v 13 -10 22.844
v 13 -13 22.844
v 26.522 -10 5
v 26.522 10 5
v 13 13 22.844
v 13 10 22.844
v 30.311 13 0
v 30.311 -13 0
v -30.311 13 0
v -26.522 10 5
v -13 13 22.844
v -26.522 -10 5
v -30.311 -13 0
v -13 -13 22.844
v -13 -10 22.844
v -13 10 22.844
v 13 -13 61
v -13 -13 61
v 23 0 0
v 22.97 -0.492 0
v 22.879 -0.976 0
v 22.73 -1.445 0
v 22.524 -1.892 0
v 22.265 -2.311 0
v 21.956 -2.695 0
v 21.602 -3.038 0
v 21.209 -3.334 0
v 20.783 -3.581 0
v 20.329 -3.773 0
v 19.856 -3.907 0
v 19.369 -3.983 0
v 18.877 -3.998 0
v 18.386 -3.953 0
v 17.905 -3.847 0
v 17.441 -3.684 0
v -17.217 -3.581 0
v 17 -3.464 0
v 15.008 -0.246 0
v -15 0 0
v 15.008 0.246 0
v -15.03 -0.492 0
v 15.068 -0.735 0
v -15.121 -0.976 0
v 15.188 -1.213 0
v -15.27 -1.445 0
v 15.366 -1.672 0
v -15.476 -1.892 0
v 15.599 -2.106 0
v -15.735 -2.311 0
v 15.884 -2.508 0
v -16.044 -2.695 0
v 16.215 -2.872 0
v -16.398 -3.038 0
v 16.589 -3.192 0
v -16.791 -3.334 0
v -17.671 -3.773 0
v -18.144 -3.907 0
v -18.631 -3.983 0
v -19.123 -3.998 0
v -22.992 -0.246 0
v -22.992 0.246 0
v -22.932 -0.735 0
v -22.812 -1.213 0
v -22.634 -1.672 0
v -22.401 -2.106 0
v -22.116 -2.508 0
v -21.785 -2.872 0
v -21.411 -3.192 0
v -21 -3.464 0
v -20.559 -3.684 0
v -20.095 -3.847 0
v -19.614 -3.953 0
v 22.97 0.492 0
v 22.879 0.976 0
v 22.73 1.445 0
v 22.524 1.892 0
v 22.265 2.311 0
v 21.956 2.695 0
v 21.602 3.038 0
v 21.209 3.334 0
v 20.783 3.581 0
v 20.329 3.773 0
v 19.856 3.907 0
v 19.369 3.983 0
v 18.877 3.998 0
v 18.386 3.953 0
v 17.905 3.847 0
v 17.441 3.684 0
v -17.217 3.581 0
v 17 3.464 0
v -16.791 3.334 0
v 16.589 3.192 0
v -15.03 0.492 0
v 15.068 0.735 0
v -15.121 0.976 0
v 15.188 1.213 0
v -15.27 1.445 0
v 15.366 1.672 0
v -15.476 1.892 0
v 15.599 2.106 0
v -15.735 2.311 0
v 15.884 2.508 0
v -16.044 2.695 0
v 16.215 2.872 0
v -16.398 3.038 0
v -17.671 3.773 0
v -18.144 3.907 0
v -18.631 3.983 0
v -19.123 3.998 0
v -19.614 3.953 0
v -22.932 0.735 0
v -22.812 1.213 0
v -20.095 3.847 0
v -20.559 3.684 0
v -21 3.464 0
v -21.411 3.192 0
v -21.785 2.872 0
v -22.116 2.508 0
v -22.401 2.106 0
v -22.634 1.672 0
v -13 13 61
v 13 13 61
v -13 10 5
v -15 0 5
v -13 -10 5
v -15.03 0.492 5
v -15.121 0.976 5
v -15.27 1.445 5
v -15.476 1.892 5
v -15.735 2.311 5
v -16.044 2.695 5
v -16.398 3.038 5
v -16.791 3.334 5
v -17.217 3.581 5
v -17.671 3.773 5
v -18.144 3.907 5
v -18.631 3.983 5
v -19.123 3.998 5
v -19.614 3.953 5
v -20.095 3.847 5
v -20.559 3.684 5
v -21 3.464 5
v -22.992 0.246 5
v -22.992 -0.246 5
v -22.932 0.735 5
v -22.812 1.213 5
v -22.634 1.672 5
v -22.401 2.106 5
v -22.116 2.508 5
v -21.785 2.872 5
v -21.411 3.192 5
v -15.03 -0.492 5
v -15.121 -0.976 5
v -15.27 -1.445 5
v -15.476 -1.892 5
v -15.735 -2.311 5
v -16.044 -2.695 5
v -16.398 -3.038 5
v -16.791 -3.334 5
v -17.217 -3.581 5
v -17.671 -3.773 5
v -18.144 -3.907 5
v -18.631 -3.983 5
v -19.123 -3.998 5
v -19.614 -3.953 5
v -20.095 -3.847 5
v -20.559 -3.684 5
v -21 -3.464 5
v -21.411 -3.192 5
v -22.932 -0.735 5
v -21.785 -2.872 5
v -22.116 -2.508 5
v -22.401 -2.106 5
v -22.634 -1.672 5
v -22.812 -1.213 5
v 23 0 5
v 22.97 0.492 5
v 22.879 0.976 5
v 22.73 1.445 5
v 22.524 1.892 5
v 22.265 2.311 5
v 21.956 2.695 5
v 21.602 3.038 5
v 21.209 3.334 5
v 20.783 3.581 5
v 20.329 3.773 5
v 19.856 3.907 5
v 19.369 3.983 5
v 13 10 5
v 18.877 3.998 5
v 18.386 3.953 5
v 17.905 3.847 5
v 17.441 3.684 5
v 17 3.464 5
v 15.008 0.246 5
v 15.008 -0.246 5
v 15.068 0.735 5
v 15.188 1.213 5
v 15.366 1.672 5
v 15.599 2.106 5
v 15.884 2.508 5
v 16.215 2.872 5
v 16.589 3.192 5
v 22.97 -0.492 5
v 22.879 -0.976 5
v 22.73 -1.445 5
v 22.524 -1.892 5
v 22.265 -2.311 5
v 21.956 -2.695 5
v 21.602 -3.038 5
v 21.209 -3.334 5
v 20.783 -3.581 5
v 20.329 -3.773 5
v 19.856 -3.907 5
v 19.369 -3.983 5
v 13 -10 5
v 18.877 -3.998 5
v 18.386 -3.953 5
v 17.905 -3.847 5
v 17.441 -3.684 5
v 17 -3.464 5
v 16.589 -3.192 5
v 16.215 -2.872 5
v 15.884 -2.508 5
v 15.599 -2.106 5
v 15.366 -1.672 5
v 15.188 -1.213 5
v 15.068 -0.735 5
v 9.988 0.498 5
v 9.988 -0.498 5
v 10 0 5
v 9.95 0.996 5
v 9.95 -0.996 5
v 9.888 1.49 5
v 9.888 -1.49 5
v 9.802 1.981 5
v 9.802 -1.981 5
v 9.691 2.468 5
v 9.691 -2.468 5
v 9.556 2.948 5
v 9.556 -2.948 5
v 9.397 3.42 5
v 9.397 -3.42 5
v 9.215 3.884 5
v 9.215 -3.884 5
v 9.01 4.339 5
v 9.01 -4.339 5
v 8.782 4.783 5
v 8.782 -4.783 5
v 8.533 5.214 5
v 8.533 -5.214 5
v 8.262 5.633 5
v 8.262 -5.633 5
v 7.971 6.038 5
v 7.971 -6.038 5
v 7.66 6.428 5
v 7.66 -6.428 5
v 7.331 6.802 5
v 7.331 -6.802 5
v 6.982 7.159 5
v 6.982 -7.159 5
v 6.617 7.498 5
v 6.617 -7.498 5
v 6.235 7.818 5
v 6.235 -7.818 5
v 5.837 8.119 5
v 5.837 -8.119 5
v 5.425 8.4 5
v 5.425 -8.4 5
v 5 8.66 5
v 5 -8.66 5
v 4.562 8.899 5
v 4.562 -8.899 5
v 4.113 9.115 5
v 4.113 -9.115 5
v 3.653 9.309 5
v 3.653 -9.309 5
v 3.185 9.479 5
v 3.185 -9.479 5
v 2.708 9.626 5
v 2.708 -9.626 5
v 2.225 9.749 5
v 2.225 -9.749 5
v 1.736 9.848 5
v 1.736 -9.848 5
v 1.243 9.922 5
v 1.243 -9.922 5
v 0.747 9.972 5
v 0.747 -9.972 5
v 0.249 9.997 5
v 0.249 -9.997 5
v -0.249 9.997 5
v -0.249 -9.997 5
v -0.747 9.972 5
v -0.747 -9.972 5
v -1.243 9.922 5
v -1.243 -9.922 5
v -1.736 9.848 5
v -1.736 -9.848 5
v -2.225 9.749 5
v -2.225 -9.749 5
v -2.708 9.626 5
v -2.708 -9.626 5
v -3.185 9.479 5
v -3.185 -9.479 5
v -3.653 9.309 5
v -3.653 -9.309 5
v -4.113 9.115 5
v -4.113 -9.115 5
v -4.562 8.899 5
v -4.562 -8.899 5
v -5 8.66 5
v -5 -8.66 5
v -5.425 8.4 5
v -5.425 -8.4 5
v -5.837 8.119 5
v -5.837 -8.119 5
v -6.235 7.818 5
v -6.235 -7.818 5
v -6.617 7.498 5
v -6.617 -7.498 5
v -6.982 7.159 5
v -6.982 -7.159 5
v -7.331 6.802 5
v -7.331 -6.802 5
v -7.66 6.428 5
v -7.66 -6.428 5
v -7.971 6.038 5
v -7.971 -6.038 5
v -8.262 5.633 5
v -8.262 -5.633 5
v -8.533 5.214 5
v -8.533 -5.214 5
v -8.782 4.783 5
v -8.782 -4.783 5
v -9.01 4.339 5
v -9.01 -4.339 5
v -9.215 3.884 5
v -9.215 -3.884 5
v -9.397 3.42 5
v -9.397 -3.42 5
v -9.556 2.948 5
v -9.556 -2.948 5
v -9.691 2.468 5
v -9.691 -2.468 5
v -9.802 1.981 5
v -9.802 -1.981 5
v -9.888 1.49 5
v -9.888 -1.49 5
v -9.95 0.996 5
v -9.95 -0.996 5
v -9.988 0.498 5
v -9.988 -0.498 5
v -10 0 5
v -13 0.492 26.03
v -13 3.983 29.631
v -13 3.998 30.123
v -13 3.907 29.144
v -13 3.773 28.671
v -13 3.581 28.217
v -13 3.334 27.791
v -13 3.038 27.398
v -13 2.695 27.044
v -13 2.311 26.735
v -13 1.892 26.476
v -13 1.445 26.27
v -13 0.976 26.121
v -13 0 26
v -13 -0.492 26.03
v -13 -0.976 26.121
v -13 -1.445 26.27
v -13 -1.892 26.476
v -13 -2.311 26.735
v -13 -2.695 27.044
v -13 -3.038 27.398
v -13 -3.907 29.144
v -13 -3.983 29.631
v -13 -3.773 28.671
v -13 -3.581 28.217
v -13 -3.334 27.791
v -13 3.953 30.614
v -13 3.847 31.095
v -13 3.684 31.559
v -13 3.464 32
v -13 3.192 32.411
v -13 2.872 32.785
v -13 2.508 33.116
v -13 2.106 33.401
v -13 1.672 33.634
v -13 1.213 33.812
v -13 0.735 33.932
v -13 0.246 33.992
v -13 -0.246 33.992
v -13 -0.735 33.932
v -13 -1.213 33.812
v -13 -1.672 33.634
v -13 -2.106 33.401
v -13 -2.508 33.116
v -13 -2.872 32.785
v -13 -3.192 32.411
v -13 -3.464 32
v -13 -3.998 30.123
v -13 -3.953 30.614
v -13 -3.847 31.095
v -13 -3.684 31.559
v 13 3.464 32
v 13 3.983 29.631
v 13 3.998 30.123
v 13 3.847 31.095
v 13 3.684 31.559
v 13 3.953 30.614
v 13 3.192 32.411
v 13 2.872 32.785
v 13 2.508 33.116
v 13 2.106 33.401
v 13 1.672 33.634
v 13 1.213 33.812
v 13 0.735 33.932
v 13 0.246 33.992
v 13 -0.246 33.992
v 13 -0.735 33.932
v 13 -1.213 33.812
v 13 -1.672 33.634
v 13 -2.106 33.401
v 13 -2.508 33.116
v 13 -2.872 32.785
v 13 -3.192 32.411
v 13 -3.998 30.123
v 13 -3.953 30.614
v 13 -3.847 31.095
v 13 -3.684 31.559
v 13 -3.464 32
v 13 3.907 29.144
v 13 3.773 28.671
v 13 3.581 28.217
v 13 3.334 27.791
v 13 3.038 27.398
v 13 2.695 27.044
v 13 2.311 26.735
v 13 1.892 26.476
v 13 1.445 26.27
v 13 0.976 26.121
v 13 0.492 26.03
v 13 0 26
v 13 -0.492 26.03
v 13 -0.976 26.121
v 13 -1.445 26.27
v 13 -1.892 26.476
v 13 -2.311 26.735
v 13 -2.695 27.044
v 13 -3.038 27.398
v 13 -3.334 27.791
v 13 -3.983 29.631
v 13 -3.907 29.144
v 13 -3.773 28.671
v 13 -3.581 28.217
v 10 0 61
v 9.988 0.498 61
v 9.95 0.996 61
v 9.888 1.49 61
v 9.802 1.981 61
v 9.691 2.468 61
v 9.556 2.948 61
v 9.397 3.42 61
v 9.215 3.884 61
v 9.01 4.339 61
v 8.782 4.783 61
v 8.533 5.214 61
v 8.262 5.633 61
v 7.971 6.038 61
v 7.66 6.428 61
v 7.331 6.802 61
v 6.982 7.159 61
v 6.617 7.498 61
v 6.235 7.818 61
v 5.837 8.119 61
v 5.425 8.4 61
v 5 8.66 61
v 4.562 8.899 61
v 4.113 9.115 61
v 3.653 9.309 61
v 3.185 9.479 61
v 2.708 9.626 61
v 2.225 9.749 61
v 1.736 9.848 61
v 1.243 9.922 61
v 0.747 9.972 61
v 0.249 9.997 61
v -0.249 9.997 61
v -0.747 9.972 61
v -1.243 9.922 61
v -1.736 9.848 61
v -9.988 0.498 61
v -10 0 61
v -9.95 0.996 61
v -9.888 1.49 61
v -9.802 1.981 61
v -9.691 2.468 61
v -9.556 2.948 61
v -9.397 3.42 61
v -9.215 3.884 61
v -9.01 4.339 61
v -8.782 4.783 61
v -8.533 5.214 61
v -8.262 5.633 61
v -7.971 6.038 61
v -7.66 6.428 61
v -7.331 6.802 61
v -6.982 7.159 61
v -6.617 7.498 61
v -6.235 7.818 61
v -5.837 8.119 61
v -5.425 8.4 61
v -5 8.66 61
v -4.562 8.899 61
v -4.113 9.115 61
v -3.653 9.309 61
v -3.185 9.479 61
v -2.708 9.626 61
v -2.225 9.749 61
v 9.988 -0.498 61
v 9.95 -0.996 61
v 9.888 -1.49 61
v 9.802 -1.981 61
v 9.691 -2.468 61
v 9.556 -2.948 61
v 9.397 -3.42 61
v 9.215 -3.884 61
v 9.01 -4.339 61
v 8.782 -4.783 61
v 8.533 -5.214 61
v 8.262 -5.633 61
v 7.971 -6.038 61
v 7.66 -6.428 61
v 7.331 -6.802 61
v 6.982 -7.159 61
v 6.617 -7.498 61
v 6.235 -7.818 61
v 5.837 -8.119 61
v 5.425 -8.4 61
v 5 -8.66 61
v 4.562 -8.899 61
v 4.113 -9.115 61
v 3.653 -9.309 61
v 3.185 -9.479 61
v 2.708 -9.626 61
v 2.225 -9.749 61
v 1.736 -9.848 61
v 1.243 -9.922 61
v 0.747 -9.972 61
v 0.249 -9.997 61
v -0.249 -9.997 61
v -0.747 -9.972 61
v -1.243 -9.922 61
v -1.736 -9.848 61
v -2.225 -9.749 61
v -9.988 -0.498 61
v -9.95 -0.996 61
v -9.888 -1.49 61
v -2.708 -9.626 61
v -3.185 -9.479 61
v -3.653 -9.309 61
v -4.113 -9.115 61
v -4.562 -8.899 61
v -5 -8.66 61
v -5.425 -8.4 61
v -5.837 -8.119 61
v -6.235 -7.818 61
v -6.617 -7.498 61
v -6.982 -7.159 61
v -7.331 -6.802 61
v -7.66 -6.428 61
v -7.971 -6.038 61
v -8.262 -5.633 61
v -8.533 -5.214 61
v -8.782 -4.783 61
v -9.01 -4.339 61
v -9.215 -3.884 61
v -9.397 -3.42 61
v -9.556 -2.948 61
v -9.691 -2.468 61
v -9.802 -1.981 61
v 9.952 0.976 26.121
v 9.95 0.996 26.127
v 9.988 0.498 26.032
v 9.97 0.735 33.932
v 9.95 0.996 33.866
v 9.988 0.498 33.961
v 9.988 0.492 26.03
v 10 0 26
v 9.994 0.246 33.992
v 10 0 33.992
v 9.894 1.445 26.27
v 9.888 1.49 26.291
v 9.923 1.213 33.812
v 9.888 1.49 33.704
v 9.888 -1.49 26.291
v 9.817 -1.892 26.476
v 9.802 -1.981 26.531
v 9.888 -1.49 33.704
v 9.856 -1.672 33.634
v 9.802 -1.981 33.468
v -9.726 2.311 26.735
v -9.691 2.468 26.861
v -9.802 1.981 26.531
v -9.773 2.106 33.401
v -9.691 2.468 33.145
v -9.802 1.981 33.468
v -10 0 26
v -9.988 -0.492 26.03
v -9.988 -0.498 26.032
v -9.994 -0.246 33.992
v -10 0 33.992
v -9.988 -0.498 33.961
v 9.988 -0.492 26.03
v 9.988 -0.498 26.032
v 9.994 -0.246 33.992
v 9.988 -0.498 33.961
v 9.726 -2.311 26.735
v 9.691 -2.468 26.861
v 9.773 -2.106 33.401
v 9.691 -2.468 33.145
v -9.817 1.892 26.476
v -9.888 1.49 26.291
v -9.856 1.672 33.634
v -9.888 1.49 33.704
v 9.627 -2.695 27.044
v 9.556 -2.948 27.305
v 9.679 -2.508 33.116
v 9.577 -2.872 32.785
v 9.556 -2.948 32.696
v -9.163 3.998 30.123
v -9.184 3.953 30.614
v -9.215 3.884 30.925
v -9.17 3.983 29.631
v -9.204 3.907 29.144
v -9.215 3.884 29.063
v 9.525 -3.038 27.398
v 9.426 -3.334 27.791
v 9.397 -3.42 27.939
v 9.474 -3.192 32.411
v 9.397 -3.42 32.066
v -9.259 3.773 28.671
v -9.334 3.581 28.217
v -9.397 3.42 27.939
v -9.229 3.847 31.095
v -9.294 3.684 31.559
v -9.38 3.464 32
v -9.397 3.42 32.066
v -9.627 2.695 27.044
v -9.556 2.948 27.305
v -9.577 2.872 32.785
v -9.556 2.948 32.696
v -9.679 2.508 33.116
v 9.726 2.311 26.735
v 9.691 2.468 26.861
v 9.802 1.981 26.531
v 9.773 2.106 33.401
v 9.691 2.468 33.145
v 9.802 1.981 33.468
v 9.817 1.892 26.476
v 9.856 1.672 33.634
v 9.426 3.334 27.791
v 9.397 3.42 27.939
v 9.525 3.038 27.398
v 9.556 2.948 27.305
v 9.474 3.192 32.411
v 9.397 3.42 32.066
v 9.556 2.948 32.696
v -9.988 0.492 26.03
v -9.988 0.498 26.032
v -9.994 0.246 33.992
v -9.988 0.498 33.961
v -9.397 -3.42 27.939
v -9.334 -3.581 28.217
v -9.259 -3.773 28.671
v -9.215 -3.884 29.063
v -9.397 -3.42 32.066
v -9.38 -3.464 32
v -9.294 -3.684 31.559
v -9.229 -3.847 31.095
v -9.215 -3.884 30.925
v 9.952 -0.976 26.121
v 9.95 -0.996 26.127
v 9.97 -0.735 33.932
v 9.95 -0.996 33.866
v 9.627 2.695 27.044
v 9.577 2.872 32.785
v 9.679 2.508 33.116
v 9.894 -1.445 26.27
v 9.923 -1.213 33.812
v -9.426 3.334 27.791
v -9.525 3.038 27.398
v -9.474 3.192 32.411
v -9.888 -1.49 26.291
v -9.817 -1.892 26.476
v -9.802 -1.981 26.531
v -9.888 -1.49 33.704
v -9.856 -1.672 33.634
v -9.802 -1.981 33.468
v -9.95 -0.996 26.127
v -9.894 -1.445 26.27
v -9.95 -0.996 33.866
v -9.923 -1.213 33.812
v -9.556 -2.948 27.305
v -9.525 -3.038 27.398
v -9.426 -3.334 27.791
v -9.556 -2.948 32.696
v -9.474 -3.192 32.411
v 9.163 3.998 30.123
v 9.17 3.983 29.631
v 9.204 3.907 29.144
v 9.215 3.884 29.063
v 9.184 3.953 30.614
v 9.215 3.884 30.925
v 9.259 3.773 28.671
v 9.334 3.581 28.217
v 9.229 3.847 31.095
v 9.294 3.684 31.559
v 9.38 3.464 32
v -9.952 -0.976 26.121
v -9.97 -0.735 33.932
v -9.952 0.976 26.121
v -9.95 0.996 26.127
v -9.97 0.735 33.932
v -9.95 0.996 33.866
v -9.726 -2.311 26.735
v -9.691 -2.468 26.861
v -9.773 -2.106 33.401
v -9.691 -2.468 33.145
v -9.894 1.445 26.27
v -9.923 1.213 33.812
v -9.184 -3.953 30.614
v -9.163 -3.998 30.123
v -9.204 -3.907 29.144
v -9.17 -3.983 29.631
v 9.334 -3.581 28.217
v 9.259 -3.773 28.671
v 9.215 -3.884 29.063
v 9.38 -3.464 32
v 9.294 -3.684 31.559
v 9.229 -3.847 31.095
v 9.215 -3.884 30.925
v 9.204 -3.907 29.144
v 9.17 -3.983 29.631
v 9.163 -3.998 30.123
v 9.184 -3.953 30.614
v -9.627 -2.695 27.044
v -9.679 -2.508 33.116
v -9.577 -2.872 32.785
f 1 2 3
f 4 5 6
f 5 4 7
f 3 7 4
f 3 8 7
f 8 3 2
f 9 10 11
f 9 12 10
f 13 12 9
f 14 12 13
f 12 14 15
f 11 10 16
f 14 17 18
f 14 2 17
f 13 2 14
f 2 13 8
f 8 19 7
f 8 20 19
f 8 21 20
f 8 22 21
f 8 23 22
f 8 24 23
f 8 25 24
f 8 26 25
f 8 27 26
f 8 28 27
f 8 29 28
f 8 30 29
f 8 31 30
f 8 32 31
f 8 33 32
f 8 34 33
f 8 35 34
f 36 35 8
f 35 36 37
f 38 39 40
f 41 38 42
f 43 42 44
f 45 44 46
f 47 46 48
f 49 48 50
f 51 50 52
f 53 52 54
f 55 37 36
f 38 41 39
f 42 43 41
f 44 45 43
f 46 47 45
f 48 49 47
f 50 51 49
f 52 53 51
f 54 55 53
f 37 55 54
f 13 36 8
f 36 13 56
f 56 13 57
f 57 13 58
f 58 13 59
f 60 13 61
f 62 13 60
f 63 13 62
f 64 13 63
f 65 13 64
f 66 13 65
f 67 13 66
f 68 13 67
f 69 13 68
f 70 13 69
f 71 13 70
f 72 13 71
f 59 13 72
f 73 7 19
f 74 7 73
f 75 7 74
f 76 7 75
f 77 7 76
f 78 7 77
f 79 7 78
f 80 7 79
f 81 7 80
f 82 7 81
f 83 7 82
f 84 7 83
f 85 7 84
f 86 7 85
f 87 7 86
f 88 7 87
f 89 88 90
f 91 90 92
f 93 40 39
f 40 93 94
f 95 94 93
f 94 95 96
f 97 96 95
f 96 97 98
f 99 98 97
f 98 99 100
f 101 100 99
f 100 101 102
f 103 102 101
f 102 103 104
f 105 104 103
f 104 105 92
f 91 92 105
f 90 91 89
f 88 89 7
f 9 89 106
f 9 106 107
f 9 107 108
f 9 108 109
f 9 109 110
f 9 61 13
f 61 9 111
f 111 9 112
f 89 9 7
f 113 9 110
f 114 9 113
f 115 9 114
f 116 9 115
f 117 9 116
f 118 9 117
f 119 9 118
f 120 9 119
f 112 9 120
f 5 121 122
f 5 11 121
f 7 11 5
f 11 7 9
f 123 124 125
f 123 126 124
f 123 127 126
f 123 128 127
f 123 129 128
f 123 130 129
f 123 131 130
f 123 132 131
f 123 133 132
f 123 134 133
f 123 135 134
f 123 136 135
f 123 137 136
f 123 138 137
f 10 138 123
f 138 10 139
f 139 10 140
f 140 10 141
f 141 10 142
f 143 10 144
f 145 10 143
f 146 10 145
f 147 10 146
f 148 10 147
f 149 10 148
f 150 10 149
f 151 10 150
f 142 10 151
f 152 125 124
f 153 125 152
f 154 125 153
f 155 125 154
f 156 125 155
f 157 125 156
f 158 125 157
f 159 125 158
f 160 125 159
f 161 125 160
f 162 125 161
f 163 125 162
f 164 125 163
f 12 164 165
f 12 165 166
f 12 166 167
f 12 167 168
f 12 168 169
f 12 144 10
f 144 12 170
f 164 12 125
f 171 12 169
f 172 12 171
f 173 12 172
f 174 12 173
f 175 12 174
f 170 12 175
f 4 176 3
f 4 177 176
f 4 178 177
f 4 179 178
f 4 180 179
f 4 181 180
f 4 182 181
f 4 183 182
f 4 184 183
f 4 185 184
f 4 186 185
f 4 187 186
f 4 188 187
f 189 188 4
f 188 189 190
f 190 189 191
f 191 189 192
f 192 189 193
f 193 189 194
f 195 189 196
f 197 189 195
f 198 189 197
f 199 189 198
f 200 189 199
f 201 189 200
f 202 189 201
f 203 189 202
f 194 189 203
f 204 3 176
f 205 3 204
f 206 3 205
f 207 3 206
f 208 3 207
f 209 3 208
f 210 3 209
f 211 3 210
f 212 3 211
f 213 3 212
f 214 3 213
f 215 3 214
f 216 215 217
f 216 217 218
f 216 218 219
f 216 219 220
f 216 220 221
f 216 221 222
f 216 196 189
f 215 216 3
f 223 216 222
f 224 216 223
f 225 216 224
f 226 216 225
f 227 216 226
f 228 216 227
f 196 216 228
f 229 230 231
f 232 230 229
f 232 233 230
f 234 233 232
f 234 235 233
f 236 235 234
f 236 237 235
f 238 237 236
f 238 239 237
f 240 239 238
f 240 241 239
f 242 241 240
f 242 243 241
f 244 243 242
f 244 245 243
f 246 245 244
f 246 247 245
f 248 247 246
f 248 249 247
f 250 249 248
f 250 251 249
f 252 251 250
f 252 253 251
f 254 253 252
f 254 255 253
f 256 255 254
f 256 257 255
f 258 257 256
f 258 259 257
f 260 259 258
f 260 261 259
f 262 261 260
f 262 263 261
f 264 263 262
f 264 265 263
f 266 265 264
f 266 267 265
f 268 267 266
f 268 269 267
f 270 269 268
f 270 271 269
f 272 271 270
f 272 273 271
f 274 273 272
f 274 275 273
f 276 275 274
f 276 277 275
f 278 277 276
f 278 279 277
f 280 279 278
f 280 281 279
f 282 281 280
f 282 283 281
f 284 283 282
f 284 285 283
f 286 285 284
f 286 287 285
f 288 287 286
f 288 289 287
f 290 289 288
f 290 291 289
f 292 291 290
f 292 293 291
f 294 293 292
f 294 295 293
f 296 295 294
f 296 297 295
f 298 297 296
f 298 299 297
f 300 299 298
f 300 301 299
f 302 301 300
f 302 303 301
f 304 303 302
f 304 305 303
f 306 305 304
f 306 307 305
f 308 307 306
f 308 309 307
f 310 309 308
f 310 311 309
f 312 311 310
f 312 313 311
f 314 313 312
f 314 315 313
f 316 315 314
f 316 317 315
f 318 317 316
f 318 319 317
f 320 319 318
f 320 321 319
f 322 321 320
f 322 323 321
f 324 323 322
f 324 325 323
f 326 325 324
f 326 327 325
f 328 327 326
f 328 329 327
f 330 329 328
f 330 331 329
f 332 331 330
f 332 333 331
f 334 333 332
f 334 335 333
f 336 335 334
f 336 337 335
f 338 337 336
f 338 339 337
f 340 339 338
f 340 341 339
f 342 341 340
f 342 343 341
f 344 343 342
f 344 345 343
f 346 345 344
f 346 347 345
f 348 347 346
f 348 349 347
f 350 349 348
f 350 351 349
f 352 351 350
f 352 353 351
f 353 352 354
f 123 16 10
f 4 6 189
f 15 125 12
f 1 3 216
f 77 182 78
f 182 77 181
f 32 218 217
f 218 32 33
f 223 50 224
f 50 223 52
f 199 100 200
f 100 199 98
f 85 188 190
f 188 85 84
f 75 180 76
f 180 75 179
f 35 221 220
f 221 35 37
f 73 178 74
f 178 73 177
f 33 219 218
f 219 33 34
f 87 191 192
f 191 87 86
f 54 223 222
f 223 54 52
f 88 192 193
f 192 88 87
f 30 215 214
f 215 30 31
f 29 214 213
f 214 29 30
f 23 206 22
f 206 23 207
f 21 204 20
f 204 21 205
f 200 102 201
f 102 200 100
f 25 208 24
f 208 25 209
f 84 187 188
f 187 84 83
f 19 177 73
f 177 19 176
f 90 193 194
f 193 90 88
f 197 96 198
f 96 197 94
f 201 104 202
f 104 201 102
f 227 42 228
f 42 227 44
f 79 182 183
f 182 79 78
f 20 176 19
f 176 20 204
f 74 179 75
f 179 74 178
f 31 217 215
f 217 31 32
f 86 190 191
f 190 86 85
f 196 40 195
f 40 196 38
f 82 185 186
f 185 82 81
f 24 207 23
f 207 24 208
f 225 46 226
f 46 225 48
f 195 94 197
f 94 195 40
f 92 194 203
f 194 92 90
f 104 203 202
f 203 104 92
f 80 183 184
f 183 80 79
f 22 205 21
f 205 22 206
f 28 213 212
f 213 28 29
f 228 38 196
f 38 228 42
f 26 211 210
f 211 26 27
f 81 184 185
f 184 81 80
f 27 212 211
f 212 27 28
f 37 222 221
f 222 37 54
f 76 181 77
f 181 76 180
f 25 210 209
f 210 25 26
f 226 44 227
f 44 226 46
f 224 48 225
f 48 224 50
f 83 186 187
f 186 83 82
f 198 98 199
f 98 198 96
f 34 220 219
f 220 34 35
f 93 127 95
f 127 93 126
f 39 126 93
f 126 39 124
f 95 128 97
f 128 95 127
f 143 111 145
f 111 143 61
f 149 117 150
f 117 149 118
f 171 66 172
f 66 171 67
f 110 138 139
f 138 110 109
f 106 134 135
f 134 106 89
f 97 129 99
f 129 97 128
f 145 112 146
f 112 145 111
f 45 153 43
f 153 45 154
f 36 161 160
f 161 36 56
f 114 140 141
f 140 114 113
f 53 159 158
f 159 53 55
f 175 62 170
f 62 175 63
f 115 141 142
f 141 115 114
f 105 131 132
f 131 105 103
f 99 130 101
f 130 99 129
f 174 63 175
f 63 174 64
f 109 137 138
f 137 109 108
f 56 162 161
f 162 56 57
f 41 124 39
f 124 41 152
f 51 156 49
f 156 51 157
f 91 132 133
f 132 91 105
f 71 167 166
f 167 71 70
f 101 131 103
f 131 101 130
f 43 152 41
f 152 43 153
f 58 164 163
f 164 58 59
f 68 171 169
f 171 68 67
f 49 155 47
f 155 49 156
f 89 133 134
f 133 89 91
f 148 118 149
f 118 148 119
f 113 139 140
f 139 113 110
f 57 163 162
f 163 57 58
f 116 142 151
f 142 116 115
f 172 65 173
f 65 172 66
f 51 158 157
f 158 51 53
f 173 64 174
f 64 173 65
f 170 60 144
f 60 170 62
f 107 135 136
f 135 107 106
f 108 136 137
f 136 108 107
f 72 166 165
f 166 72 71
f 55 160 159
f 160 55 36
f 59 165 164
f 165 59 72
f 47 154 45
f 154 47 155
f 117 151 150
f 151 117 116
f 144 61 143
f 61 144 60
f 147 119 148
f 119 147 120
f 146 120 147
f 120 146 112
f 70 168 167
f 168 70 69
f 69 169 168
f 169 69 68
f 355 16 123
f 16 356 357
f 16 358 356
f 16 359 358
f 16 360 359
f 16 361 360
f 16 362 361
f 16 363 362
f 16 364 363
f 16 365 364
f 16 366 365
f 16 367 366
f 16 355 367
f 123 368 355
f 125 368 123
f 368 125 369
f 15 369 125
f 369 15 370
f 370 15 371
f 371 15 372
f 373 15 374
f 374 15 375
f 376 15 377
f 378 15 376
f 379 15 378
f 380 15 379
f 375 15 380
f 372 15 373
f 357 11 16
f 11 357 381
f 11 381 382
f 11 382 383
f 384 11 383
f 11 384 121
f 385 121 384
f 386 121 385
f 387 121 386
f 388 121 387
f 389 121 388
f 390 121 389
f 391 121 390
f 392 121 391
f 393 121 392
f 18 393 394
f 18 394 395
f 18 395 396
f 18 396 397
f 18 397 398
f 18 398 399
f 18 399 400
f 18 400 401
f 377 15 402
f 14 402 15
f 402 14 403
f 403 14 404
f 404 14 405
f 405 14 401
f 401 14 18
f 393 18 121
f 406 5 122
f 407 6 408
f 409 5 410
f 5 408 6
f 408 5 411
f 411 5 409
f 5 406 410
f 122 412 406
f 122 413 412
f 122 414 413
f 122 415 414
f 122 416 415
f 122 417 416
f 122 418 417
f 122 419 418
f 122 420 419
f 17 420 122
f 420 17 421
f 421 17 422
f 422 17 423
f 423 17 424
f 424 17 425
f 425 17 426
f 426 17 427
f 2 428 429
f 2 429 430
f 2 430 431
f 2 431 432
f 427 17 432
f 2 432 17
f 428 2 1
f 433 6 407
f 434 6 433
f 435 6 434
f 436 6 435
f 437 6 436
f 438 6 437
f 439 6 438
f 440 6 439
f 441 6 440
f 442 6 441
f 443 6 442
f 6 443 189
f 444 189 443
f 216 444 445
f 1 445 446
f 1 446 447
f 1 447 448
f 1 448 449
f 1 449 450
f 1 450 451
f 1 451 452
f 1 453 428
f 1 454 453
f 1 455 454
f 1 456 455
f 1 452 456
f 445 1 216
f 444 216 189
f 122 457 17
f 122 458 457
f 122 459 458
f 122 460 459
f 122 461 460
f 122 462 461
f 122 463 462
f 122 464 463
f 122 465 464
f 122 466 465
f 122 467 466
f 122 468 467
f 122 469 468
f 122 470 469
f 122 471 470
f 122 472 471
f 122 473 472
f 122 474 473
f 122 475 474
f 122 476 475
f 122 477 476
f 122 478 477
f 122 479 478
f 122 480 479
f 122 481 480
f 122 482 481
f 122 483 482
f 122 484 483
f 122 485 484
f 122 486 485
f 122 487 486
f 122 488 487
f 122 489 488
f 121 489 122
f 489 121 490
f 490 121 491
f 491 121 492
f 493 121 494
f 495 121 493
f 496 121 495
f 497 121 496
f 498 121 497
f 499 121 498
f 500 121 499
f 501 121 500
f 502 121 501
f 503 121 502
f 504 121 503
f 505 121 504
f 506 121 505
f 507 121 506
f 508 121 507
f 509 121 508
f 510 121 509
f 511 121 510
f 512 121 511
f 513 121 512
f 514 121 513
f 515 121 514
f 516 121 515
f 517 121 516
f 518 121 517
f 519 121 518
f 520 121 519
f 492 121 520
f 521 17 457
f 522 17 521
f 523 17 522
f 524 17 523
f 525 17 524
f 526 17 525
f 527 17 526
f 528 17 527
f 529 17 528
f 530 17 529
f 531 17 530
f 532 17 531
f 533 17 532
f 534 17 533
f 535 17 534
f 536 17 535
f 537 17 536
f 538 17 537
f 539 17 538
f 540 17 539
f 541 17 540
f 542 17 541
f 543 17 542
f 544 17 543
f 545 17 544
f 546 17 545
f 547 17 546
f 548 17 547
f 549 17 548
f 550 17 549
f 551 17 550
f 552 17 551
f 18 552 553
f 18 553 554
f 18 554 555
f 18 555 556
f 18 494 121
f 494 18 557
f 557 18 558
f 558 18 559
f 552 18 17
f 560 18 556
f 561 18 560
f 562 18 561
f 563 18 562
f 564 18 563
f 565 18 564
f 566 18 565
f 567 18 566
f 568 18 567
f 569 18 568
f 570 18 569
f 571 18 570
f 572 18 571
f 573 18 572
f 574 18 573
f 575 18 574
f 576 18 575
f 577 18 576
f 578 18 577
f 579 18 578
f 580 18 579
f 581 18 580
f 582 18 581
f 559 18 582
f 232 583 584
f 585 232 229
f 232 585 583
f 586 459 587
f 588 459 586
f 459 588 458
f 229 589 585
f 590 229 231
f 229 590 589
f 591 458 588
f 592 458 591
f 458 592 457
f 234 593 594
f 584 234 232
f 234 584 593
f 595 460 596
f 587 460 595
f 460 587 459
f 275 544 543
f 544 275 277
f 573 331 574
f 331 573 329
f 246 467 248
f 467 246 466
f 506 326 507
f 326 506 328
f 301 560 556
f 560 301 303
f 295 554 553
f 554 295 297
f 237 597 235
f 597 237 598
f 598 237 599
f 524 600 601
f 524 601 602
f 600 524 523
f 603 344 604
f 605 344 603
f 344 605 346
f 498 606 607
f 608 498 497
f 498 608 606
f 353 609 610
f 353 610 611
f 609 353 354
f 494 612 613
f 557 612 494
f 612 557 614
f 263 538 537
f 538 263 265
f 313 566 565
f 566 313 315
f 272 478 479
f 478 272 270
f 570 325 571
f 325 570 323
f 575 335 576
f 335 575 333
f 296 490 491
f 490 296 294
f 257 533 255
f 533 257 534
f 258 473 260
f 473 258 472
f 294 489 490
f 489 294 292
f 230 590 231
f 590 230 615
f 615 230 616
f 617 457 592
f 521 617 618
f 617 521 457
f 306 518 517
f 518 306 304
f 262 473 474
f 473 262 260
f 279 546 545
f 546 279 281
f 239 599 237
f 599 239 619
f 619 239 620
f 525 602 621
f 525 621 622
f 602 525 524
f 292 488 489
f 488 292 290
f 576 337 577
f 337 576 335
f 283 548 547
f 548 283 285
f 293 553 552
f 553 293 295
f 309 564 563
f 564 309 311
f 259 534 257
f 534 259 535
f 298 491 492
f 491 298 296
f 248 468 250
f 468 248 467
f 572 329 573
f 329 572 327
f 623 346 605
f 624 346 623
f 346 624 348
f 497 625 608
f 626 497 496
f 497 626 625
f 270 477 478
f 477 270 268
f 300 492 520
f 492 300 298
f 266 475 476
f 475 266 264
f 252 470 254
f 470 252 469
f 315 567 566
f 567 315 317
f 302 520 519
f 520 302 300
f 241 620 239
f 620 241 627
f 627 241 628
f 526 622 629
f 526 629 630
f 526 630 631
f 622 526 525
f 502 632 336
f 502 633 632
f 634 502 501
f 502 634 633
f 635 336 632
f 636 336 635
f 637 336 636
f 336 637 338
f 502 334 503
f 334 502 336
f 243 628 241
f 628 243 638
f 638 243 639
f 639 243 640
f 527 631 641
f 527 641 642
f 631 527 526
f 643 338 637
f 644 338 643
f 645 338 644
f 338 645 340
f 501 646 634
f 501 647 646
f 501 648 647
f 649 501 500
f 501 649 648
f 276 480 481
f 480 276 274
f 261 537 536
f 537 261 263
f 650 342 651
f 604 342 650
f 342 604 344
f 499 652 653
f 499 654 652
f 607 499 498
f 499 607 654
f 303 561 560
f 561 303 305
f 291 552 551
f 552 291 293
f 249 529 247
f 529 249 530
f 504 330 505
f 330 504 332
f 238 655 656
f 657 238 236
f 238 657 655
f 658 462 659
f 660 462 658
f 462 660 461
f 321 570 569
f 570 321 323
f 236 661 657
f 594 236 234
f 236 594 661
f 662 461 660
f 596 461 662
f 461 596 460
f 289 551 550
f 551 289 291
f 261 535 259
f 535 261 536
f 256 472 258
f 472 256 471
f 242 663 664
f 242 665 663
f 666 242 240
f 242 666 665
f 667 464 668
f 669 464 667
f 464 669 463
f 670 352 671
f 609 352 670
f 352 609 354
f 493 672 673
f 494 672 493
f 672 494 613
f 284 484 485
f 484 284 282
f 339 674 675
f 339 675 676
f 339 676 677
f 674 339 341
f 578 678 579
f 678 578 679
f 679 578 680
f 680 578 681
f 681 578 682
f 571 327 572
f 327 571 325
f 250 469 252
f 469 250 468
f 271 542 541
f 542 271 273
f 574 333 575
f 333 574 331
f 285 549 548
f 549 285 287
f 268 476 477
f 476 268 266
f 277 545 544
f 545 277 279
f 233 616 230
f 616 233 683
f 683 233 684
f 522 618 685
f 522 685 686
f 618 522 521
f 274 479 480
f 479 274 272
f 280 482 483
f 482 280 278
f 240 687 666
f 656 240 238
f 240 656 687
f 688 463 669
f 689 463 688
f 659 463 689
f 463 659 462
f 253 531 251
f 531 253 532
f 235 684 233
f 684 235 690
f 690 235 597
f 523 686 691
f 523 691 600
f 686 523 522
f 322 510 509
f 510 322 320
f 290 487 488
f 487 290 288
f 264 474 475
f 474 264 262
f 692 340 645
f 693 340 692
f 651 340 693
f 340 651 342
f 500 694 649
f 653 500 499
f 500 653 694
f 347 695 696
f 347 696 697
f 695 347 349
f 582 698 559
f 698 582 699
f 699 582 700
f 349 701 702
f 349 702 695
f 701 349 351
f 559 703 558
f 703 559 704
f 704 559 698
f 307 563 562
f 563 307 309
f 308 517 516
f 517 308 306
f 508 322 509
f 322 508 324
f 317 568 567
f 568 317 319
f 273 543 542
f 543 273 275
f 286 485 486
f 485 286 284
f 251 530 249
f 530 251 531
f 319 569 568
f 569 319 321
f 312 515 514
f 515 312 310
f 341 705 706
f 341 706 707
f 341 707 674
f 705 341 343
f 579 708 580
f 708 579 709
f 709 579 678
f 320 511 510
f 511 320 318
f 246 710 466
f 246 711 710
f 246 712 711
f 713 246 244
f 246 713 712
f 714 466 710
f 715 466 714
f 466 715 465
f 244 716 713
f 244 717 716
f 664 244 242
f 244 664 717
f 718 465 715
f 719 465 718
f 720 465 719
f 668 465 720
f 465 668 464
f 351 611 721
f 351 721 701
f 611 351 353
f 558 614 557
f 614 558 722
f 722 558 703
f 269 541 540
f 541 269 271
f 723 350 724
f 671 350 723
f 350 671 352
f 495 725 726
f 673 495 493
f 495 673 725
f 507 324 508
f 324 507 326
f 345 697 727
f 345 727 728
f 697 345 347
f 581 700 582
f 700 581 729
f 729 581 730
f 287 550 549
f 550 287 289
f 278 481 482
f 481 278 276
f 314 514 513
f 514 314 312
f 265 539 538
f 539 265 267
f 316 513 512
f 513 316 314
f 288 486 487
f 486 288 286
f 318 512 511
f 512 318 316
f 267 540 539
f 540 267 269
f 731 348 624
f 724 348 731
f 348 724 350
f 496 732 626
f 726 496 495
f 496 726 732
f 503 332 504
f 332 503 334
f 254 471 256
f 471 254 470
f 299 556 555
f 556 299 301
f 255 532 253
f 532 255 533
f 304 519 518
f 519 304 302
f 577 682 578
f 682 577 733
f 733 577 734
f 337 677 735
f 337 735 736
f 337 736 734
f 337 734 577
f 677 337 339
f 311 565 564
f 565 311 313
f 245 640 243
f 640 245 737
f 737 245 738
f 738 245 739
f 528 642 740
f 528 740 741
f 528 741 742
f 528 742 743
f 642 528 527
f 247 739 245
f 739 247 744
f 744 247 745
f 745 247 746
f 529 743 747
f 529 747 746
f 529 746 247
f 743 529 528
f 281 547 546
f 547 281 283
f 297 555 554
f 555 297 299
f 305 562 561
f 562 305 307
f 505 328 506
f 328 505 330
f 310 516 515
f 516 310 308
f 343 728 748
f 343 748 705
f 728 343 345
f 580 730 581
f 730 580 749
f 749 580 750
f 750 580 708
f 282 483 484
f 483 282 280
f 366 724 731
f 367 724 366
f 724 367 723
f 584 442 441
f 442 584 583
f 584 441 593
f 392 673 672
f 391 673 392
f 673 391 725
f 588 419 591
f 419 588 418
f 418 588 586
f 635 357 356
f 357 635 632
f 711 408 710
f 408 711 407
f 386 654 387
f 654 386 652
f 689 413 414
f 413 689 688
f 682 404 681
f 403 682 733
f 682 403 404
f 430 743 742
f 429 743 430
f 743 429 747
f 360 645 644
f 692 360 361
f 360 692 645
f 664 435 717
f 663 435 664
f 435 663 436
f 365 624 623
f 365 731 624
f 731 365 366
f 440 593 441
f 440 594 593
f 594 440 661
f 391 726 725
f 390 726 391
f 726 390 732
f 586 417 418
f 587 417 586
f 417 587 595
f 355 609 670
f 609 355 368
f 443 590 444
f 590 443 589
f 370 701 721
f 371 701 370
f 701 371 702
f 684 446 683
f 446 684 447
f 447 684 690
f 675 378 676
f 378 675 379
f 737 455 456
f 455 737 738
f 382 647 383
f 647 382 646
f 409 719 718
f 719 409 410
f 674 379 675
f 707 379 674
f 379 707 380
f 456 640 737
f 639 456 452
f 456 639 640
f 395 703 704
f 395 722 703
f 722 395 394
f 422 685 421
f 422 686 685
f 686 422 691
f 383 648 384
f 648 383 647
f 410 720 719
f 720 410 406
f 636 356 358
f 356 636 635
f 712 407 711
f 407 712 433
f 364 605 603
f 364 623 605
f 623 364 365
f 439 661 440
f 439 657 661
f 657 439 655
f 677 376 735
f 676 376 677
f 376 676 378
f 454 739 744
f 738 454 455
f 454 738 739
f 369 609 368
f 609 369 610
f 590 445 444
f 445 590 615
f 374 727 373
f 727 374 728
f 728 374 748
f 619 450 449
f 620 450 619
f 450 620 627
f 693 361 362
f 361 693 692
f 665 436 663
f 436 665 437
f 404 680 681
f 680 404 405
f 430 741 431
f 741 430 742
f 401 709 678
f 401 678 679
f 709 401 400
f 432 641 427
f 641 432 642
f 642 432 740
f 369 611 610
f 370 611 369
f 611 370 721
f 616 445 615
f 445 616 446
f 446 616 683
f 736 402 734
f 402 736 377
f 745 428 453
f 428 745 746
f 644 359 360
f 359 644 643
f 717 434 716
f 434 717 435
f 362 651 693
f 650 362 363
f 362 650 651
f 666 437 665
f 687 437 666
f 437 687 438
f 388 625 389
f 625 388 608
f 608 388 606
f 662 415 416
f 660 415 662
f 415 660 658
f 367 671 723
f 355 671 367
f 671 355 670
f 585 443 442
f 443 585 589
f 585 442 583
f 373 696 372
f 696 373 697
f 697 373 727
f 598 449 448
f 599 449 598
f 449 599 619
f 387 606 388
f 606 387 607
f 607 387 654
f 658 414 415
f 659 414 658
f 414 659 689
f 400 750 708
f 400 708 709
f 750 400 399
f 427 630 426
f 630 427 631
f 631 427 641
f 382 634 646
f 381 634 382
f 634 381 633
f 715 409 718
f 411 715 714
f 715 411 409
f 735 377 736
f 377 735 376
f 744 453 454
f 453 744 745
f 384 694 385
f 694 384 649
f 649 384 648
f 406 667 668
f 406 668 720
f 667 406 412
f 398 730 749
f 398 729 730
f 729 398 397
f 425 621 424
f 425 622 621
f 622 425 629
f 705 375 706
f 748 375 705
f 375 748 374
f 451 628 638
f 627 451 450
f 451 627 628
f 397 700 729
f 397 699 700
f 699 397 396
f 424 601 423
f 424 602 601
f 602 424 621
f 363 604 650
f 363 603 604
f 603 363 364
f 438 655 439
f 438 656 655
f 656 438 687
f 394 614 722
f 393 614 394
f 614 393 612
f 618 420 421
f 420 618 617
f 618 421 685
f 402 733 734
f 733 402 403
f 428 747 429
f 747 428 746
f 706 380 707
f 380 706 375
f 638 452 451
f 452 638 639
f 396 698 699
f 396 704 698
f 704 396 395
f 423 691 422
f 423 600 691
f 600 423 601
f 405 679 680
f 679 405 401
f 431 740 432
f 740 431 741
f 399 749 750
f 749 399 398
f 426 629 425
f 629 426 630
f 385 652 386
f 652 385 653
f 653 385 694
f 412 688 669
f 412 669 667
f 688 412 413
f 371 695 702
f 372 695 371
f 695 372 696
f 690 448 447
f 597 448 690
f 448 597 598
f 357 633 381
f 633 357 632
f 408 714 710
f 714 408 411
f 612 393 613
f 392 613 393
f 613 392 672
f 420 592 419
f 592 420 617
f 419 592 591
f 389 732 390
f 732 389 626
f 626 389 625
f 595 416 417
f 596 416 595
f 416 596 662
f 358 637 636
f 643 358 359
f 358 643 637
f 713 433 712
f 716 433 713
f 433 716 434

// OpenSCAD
$fs = 0.5;
$fa = 0.5;

leg_r = 10;
side_width = 3;
width = leg_r*2 + side_width*2;
hole_r = 4;
center_distance = 38;
height = 60;
base_height = 5;
base_length = 70;

// === Shapes
// Base
difference() {
    resize([0, 0, 2*height/3])
        rotate([90, -90, 0])
            translate([base_length/4, 0, width/2-width])
                cylinder(width, base_length/2, base_length/2, $fn=3);
    translate([0, 0, base_length/2+base_height])
        cube([base_length, width-side_width*2, base_length], center=true);
    // Holes
    translate([center_distance/2, 0, -1])
        cylinder(base_height+2, hole_r, hole_r);
    translate([-center_distance/2, 0, -1])
        cylinder(base_height+2, hole_r, hole_r);
}

// Tower
difference() {
    translate([0, 0, width+base_height])
        rotate([90, 0, 0])
            cube([width, height, width], center=true);
    translate([0, 0, base_height])
        cylinder(height, leg_r, leg_r);
    translate([-width/2-1, 0, height/2])
        rotate([0, 90, 0])
            cylinder(width+2, hole_r, hole_r);
}
